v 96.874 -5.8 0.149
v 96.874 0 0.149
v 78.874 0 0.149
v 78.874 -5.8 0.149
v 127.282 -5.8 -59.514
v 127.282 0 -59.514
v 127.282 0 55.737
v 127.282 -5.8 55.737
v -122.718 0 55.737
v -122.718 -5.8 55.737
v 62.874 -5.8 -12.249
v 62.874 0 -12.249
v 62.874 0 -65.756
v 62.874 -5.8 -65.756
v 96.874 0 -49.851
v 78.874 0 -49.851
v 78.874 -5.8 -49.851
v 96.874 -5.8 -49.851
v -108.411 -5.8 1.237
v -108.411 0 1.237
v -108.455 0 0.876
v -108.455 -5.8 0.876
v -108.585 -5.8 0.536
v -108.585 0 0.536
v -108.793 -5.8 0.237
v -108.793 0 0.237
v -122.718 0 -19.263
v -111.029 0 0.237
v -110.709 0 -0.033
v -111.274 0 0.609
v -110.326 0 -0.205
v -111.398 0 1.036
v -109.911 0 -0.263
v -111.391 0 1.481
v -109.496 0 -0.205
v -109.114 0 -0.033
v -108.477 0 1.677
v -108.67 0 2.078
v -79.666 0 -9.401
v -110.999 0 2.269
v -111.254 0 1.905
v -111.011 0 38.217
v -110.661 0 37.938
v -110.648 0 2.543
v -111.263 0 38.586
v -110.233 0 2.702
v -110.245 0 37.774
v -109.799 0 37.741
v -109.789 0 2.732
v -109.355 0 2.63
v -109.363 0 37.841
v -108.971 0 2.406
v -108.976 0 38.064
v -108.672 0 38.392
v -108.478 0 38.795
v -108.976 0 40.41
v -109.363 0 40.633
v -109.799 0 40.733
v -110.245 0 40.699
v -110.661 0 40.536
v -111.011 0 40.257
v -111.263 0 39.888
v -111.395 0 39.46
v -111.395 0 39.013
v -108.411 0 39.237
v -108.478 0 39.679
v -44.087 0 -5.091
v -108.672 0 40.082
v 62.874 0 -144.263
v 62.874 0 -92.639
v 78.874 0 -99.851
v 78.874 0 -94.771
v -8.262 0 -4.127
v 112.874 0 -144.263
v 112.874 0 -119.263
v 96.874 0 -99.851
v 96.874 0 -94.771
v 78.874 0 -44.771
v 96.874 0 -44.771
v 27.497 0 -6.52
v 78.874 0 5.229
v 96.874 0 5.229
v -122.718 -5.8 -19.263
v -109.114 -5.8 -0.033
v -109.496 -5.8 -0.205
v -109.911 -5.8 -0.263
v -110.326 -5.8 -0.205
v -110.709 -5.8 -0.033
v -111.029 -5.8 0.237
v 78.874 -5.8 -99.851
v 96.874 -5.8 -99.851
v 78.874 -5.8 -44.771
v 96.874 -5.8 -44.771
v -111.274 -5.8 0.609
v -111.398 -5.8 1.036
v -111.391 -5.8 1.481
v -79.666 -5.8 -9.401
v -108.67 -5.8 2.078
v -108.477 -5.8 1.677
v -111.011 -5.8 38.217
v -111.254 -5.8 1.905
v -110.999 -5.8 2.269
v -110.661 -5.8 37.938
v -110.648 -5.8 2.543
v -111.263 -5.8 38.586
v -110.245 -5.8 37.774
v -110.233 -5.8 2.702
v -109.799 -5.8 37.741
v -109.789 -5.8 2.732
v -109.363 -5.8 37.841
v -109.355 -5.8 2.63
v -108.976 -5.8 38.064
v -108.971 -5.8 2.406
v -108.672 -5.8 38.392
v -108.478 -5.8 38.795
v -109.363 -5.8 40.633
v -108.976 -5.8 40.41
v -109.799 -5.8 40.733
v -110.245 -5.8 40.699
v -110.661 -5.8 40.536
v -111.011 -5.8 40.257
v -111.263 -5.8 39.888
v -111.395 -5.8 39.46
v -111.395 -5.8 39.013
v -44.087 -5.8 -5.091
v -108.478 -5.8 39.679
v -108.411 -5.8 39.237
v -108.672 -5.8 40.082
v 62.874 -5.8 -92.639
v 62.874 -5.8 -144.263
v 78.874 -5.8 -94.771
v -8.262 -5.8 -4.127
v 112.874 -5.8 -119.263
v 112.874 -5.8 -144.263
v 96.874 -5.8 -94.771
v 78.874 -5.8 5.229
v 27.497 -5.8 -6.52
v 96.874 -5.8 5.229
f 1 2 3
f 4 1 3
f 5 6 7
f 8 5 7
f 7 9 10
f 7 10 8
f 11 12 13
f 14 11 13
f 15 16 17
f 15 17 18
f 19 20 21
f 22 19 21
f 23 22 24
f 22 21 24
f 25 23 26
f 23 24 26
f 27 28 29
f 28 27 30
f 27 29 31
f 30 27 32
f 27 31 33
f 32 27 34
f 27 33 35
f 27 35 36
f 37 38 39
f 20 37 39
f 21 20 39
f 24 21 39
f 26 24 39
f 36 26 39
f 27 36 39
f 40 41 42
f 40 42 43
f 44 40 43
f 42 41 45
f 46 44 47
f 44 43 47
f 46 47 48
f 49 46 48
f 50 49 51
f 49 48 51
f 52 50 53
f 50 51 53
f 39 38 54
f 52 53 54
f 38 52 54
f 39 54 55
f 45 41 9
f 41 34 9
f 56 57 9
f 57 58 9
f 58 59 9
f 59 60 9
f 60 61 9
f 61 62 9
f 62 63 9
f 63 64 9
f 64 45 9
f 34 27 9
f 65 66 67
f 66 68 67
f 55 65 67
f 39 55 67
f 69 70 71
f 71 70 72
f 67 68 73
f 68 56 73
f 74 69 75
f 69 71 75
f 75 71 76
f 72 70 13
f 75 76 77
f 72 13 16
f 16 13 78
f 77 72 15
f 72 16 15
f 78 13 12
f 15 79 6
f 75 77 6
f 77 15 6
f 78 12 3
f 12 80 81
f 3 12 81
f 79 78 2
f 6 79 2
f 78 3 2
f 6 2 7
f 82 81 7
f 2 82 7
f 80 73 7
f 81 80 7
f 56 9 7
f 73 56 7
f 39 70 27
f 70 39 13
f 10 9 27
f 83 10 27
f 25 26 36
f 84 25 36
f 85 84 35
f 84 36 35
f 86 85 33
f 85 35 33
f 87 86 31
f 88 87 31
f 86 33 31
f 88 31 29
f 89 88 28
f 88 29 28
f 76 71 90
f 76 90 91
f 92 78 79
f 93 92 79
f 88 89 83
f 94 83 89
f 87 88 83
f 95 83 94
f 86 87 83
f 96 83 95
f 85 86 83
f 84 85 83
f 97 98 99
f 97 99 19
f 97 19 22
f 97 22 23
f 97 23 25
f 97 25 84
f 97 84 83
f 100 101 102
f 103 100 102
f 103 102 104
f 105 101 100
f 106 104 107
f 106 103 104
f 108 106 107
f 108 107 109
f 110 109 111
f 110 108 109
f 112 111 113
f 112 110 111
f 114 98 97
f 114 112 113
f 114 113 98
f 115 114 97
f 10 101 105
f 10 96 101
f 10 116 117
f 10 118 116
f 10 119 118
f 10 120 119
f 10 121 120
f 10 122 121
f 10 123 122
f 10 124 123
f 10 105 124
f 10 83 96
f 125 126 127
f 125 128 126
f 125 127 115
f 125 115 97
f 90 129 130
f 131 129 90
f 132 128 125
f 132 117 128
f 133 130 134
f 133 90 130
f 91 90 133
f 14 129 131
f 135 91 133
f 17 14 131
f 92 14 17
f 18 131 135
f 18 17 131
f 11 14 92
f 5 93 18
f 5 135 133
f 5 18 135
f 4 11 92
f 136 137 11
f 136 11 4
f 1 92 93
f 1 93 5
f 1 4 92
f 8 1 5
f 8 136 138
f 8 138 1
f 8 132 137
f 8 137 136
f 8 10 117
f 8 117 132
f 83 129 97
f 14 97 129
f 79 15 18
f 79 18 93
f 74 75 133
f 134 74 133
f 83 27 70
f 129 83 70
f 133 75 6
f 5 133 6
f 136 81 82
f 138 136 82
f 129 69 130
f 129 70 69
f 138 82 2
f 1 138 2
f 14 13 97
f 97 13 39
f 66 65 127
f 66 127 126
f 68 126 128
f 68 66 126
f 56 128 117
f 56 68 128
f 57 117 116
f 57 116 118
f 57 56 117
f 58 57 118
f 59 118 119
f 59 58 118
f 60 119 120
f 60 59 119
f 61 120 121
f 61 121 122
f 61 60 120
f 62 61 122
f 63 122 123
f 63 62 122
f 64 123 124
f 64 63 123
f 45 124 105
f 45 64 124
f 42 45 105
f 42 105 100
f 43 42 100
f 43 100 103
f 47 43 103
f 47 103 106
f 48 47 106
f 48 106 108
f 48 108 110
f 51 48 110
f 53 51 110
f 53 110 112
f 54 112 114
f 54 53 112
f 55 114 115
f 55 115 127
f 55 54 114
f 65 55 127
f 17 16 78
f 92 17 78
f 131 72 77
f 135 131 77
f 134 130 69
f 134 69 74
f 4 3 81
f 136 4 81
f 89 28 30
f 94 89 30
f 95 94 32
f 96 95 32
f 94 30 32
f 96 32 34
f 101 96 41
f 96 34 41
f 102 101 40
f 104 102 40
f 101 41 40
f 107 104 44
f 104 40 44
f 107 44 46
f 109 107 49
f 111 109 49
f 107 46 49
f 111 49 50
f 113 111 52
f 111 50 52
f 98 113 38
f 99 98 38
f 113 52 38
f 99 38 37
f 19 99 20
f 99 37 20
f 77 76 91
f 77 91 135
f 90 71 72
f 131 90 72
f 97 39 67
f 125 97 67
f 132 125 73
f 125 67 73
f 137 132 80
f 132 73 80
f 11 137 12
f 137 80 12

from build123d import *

# Parameters (mm, degrees)
F0_W      = 250
F0_H      = 10.25
F0_H_2    = 35
F0_R      = 1.5
F0_W_2    = 18
F0_H_3    = 5.08
F1_DEPTH  = 5.8
F1_FACE_W = 50
F1_FACE_H = 5.8
F2_DEPTH  = 25


with BuildPart() as f1:
    # F0 (on Front) → F1 (new body)
    with BuildSketch(Plane.XZ):
        with Locations((2.281713, 50.611829)):
            Rectangle(F0_W, F0_H)
        with Locations((2.281713, 27.986829)):
            Rectangle(F0_W, F0_H_2)
        with Locations((-109.911287, 39.236829)):
            Circle(F0_R, mode=Mode.SUBTRACT)
        with BuildLine():
            Line((127.281713, 0.236829), (127.281713, 10.486829))
            Line((127.281713, 10.486829), (-122.718287, 10.486829))
            Line((-122.718287, 10.486829), (-122.718287, 0.236829))
            Line((-122.718287, 0.236829), (-111.029321, 0.236829))
            ThreePointArc((-111.029321, 0.236829), (-110.44652, 2.638087), (-108.411287, 1.236829))
            ThreePointArc((-108.411287, 1.236829), (-108.510028, 0.701596), (-108.793253, 0.236829))
            Line((-108.793253, 0.236829), (78.874297, 0.236829))
            Line((78.874297, 0.236829), (78.874297, 5.228526))
            Line((78.874297, 5.228526), (96.874297, 5.228526))
            Line((96.874297, 5.228526), (96.874297, 0.236829))
            Line((96.874297, 0.236829), (127.281713, 0.236829))
        make_face()
        with BuildLine():
            Line((127.281713, -59.514336), (127.281713, 0.236829))
            Line((127.281713, 0.236829), (96.874297, 0.236829))
            Line((96.874297, 0.236829), (96.874297, 0.148526))
            Line((96.874297, 0.148526), (78.874297, 0.148526))
            Line((78.874297, 0.148526), (78.874297, 0.236829))
            Line((78.874297, 0.236829), (-108.793253, 0.236829))
            ThreePointArc((-108.793253, 0.236829), (-109.911287, -0.263171), (-111.029321, 0.236829))
            Line((-111.029321, 0.236829), (-122.718287, 0.236829))
            Line((-122.718287, 0.236829), (-122.718287, -19.263171))
            ThreePointArc((-122.718287, -19.263171), (-101.334346, -13.710596), (-79.665576, -9.401492))
            ThreePointArc((-79.665576, -9.401492), (-8.261862, -4.127499), (62.874297, -12.248605))
            Line((62.874297, -12.248605), (62.874297, -65.755888))
            Line((62.874297, -65.755888), (62.874297, -92.638836))
            Line((62.874297, -92.638836), (62.874297, -119.263171))
            Line((62.874297, -119.263171), (112.874297, -119.263171))
            Line((112.874297, -119.263171), (127.281713, -59.514336))
        make_face()
        with Locations((87.874297, -97.311474)):
            Rectangle(F0_W_2, F0_H_3, mode=Mode.SUBTRACT)
        with Locations((87.874297, -47.311474)):
            Rectangle(F0_W_2, F0_H_3, mode=Mode.SUBTRACT)
        with BuildLine():
            ThreePointArc((-79.665576, -9.401492), (-101.334346, -13.710596), (-122.718287, -19.263171))
            Line((-122.718287, -19.263171), (62.874297, -92.638836))
            Line((62.874297, -92.638836), (62.874297, -65.755888))
            Line((62.874297, -65.755888), (-79.665576, -9.401492))
        make_face()
    extrude(amount=F1_DEPTH)

    # F1_face (on face) → F2 (join)
    with BuildSketch(Plane(origin=(87.874297, -2.9, -119.263171), x_dir=(1, 0, 0), z_dir=(0, 0, -1))):
        Rectangle(F1_FACE_W, F1_FACE_H)
    extrude(amount=F2_DEPTH)


solid = f1.part
